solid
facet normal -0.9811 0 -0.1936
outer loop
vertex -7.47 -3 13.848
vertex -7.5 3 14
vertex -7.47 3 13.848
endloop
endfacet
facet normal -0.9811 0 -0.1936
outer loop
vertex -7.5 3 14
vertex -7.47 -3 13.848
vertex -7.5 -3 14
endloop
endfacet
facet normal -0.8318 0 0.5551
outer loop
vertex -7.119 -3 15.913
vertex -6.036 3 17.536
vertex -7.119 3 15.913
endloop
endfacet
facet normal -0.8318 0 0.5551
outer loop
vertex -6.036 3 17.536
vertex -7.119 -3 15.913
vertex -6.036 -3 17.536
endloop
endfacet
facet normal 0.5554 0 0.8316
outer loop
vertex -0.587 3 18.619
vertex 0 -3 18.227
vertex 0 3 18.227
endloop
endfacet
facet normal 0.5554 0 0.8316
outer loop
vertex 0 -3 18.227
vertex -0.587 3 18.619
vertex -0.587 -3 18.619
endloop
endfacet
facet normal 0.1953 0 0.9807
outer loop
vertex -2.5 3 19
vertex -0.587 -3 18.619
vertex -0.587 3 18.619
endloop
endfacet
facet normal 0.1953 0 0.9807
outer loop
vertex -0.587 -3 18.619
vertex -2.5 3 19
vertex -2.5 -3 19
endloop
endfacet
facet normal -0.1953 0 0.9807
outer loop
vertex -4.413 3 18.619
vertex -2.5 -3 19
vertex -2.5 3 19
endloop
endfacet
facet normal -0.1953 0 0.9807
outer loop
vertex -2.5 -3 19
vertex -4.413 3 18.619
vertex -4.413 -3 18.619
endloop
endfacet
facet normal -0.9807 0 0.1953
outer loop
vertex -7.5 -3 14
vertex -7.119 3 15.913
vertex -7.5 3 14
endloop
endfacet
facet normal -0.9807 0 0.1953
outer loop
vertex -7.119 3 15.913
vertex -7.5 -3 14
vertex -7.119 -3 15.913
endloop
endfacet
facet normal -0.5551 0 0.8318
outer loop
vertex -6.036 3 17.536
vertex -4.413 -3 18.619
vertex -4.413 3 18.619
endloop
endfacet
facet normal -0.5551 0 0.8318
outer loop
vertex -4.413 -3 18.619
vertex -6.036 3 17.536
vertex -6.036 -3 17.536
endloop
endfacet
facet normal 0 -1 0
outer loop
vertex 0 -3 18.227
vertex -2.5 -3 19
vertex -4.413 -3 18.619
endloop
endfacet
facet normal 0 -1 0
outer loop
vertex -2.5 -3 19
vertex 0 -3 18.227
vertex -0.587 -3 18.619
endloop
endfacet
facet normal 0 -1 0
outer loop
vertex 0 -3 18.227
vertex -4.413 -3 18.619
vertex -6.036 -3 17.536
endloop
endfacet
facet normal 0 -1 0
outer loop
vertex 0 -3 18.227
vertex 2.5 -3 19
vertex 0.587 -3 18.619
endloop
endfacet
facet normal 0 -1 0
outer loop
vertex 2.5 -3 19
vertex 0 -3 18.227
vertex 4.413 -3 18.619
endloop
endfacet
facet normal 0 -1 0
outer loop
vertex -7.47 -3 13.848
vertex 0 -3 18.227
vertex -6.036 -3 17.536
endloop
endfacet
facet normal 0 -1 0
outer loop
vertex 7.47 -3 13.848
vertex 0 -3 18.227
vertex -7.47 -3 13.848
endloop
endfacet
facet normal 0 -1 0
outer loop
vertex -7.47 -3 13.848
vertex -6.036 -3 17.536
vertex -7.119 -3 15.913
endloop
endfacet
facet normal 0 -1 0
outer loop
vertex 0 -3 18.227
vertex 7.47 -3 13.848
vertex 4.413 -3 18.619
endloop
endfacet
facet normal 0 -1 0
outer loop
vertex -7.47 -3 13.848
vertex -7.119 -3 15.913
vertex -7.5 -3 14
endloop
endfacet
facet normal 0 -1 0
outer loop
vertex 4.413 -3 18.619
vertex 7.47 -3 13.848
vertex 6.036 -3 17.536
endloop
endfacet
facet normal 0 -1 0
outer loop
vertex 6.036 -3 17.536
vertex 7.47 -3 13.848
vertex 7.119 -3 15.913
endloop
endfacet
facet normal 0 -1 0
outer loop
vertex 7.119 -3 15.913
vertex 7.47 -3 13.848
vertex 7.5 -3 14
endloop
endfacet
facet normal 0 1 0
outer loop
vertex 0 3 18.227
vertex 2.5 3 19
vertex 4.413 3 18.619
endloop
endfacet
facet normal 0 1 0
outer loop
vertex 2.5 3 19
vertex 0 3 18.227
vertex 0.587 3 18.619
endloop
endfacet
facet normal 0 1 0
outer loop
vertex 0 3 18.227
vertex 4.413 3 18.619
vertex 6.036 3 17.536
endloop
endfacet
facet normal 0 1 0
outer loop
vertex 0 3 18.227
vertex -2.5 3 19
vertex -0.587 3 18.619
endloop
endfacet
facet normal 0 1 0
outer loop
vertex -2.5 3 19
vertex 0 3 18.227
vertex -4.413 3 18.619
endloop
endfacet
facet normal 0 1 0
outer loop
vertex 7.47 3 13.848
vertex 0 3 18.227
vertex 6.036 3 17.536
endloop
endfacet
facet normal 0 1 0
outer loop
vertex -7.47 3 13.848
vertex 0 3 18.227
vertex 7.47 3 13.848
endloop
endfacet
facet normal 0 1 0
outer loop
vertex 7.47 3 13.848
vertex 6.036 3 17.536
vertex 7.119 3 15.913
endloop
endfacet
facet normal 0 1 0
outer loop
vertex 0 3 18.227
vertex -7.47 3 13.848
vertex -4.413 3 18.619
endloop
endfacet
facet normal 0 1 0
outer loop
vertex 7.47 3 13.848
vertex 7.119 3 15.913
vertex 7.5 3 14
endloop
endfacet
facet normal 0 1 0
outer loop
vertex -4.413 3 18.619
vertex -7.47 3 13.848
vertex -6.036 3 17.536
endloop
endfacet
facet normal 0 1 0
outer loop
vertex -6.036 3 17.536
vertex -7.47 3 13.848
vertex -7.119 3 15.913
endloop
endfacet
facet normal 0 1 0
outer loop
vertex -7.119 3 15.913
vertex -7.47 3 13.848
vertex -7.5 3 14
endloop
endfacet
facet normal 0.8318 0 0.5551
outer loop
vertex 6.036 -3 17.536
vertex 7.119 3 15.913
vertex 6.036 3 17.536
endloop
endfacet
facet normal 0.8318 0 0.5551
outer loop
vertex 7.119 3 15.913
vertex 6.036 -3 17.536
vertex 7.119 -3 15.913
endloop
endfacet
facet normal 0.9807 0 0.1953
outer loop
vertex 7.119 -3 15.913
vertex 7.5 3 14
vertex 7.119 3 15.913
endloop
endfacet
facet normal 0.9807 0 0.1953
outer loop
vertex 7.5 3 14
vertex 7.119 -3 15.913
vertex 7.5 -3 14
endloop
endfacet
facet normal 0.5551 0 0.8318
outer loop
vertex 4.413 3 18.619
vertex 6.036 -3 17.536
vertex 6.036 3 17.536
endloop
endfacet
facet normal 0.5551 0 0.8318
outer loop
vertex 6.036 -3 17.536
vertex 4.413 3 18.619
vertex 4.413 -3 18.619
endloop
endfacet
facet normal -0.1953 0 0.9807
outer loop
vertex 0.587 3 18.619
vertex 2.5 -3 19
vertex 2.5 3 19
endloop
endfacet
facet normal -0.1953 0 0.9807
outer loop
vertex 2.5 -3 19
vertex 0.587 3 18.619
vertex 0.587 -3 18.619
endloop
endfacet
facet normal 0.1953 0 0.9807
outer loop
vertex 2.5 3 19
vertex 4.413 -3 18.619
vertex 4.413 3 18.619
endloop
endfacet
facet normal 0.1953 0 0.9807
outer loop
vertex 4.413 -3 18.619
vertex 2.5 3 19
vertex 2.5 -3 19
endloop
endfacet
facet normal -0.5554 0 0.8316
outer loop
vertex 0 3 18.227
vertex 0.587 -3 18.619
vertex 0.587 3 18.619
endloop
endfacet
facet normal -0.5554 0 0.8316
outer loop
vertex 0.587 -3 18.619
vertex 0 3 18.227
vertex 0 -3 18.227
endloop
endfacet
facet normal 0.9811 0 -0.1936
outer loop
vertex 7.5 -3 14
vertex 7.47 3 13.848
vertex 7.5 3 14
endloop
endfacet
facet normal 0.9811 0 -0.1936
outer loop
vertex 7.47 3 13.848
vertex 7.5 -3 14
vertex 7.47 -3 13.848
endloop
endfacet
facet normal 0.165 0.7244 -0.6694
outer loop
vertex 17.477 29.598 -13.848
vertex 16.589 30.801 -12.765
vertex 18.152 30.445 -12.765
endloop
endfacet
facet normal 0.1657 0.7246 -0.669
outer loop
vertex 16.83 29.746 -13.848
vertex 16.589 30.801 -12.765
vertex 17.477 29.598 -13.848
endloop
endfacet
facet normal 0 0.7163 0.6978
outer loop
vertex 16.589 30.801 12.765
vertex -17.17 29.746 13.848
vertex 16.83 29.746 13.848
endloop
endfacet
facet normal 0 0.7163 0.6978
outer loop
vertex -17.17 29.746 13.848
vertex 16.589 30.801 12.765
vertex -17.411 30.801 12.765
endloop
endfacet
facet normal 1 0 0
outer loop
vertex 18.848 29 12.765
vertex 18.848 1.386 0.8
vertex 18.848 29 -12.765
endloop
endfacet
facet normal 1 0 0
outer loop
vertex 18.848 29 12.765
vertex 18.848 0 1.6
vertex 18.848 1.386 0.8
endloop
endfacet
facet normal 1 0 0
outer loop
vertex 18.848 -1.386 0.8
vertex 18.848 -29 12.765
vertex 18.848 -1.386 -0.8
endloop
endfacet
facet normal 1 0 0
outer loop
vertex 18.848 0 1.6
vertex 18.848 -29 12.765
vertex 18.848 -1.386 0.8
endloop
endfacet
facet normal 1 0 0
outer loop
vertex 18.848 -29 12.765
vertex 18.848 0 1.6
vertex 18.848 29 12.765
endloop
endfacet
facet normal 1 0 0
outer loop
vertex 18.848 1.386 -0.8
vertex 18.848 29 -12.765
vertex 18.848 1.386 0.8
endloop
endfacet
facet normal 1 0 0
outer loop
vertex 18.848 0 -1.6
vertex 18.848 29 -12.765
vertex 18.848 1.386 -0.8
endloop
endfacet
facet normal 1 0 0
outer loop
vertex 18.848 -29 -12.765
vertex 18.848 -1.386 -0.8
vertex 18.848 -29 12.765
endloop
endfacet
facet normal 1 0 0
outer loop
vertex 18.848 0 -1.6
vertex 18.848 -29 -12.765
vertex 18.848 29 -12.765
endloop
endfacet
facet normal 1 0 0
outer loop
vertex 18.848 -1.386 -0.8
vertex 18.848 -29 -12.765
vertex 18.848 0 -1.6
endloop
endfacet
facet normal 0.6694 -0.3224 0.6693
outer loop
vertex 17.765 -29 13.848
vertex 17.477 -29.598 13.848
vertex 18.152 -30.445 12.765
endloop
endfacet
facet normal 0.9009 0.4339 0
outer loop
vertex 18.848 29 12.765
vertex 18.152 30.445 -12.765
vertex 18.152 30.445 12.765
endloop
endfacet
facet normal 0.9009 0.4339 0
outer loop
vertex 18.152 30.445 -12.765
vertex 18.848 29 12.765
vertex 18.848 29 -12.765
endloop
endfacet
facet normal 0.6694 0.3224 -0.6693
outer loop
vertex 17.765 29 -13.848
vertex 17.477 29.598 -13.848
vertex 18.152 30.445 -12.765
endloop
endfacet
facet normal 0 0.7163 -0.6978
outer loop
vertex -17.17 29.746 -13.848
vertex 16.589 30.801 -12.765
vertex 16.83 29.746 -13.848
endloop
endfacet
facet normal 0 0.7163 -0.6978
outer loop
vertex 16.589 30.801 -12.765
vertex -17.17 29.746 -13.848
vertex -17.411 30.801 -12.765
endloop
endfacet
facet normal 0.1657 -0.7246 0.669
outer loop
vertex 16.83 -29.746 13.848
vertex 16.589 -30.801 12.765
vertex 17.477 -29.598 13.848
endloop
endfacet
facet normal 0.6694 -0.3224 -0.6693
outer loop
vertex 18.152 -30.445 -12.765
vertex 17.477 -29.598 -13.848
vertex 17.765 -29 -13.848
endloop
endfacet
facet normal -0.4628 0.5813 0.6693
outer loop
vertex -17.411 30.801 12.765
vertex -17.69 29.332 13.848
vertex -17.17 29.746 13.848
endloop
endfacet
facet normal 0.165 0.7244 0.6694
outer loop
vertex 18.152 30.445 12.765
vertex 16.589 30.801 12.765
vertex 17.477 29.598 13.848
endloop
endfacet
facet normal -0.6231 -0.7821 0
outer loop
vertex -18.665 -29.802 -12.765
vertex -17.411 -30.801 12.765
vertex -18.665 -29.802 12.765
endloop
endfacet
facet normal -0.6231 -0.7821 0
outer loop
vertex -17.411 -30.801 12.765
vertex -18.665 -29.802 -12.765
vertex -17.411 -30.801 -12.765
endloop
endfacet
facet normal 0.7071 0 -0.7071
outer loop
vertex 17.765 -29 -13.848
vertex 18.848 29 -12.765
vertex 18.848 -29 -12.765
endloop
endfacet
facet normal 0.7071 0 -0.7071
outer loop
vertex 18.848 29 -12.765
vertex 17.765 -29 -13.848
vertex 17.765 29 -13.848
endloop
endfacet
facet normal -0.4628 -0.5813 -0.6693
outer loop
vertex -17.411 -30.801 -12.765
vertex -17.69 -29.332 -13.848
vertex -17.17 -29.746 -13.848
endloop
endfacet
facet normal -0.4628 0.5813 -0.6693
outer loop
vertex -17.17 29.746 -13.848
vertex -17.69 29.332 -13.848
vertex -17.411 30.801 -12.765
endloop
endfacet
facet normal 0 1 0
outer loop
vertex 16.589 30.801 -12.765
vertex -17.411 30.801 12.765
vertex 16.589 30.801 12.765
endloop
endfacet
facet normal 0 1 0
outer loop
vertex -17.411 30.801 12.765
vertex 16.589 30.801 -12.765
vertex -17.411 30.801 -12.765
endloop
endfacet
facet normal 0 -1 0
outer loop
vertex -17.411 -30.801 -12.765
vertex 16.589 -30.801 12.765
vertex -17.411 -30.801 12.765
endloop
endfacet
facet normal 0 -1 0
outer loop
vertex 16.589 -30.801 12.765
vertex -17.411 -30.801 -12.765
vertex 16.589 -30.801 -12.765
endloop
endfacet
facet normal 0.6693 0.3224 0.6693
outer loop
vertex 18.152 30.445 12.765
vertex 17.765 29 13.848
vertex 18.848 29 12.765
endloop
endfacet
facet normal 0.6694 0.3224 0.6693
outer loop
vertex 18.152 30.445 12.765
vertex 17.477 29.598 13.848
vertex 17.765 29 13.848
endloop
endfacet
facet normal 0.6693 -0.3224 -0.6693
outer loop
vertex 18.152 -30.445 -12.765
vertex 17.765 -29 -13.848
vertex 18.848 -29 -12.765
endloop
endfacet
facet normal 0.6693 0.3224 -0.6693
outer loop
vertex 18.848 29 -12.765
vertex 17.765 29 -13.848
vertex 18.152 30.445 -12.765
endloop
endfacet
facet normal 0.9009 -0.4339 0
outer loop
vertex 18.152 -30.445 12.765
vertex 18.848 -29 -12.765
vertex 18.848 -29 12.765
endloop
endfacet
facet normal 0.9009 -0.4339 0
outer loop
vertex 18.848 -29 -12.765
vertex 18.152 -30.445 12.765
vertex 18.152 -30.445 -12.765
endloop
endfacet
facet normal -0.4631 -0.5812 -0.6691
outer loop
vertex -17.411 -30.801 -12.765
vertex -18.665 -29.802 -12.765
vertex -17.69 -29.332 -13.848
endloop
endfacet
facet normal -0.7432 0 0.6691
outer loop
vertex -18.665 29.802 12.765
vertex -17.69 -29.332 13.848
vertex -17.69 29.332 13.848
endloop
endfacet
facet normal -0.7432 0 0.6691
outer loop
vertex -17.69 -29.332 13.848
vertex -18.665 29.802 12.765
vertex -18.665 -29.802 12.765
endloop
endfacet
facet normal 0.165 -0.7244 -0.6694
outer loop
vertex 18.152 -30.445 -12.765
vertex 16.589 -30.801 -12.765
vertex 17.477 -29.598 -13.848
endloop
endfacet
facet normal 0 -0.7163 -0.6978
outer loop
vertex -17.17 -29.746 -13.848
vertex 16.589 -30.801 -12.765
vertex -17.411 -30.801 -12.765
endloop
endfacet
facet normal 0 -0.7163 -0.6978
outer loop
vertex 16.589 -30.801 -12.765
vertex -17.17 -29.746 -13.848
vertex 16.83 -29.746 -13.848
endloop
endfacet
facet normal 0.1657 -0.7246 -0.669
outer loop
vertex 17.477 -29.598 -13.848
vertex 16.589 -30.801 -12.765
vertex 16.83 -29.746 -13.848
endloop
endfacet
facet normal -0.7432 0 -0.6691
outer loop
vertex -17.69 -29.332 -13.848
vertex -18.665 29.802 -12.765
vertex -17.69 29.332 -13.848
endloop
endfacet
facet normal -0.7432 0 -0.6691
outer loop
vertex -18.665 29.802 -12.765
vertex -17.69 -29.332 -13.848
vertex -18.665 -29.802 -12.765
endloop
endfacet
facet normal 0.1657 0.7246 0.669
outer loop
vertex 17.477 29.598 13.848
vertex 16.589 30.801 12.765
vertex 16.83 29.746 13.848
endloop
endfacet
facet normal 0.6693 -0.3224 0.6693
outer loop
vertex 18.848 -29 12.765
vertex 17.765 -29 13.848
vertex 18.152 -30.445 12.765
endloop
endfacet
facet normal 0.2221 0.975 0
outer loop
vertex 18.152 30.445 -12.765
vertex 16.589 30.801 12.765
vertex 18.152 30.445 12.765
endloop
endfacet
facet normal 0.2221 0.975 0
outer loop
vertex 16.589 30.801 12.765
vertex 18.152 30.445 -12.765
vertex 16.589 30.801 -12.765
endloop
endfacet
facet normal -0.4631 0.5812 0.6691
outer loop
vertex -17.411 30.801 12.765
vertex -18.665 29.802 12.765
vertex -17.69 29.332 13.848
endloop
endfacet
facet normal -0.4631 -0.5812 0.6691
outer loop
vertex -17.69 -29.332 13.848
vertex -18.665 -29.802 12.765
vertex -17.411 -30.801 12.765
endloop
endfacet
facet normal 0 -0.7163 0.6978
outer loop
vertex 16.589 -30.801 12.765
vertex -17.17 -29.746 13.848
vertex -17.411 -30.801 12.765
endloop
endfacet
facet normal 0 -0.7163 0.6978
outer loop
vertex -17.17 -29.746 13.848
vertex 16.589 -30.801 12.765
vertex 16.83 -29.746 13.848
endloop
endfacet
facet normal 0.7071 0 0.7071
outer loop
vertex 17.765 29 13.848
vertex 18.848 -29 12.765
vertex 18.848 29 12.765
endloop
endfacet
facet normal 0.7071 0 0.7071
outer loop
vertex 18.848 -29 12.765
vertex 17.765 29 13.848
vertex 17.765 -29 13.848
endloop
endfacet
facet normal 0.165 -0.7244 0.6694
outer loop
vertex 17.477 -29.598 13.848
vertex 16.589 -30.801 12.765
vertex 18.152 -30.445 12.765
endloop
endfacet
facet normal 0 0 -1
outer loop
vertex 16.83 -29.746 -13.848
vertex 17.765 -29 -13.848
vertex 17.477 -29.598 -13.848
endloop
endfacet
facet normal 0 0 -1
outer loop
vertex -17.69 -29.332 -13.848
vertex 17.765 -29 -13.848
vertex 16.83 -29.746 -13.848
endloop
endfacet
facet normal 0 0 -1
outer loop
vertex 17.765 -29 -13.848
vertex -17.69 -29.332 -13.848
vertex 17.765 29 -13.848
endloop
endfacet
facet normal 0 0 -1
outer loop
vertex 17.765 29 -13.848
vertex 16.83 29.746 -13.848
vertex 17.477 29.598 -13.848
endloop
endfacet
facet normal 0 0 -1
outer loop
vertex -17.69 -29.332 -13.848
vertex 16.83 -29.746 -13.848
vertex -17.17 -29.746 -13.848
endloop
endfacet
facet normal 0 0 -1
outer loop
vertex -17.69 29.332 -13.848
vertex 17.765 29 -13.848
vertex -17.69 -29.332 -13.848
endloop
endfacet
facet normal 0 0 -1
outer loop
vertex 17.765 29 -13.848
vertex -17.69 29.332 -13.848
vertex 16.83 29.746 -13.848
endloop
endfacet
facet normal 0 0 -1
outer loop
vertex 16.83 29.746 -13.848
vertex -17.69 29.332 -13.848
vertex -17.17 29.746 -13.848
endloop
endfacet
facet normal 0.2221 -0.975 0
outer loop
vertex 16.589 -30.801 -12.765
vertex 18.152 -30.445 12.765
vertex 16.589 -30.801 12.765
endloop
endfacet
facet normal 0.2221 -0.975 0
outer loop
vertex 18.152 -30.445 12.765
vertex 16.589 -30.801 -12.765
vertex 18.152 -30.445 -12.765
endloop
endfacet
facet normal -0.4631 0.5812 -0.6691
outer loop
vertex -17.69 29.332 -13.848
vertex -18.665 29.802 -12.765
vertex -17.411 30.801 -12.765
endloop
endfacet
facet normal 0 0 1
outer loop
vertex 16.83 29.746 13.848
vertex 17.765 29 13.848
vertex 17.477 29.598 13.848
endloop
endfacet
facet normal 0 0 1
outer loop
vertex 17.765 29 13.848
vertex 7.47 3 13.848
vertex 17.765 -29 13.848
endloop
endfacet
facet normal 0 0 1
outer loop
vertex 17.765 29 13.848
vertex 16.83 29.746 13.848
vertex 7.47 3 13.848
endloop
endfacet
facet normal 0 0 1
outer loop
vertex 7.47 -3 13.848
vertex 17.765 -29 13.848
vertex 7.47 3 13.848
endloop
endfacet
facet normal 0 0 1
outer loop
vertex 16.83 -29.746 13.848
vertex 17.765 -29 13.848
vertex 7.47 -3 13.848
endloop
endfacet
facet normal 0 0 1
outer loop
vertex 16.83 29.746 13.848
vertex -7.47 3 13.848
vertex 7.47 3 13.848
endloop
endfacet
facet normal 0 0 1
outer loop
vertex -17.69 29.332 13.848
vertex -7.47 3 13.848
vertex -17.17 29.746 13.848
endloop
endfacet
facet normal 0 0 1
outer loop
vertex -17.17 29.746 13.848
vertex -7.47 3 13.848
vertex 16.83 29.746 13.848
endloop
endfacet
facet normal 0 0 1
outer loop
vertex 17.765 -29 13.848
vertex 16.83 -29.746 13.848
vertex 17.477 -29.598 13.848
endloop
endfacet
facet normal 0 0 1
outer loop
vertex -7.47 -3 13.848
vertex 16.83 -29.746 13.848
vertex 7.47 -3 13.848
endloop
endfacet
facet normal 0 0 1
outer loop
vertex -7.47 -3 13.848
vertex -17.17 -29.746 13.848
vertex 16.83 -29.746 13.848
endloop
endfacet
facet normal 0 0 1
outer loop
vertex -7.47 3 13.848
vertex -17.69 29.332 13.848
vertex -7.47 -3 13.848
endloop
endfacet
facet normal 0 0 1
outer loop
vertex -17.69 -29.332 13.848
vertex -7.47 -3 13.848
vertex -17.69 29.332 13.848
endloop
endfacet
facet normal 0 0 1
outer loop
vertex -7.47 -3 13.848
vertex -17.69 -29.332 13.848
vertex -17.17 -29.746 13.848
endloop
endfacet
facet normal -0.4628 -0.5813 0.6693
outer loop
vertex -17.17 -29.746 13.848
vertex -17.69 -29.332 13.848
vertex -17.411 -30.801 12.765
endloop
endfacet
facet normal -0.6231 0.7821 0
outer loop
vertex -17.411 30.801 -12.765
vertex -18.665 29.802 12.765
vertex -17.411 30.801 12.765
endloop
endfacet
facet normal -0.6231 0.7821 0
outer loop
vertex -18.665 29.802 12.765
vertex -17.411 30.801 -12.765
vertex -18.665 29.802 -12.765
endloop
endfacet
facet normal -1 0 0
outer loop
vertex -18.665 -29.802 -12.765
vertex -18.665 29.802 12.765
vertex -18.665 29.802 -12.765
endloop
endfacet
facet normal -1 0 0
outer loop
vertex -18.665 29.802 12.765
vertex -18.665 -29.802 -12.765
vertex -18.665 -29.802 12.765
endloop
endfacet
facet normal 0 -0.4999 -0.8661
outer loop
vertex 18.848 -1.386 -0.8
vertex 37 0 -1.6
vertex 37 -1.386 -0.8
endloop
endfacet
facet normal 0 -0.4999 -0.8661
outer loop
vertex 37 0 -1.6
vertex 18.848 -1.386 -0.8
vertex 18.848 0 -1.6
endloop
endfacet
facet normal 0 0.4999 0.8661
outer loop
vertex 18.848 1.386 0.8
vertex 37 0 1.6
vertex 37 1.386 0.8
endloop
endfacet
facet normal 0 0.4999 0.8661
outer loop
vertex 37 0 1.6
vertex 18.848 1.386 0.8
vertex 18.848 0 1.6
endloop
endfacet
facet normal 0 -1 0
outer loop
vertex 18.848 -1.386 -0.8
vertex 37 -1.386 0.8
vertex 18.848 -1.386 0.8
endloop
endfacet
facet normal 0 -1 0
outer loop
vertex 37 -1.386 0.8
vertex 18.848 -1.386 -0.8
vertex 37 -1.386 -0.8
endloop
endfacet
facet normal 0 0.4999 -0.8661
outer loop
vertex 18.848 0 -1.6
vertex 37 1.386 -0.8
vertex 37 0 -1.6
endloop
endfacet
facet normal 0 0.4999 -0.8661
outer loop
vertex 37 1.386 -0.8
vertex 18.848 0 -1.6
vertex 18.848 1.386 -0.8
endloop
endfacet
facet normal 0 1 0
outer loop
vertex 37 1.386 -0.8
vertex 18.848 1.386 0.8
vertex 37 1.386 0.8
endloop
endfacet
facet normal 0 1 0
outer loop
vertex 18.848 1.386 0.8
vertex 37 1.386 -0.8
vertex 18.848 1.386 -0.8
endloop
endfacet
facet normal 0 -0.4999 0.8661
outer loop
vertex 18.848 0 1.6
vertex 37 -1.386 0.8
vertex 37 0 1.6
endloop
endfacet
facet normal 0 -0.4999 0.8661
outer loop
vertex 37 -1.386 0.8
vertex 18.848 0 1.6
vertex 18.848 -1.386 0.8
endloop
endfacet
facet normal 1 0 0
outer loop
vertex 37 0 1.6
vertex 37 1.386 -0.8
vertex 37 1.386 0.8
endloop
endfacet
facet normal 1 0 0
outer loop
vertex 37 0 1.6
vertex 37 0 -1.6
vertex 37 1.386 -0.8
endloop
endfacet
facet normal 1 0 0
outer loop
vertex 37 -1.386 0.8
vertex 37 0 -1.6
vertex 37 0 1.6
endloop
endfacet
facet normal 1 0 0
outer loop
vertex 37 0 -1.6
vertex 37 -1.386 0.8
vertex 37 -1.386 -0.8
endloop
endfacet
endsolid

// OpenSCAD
// Parameters
shaft_diameter_mm = 6; //[3:12:0.1]
shaft_bore_clearance_mm = 0.2; //[0.05:0.6:0.05]
block_width_mm = 34; //[17:68:0.5]
block_length_mm = 58; //[29:116:0.5]
block_height_mm = 24; //[12:48:0.5]
corner_radius_mm = 2; //[0:6:0.25]
bearing_outer_diameter_mm = 12; //[8:24:0.1]
bearing_length_mm = 19; //[10:40:0.5]
bearing_seat_clearance_mm = 0.1; //[0:0.4:0.05]
mount_hole_diameter_mm = 5; //[3:8:0.1]
mount_hole_spacing_x_mm = 24; //[12:48:0.5]
mount_hole_spacing_y_mm = 44; //[22:88:0.5]
counterbore_enabled = 1; //[0:1:1]
counterbore_diameter_mm = 9; //[6:14:0.1]
counterbore_depth_mm = 3; //[0:8:0.25]
clamp_enabled = 1; //[0:1:1]
clamp_slot_width_mm = 2; //[1:4:0.1]
clamp_slot_depth_mm = 14; //[6:22:0.5]
clamp_screw_diameter_mm = 3.2; //[2.2:6.5:0.1]
clamp_boss_diameter_mm = 10; //[6:18:0.5]
clamp_boss_height_mm = 6; //[3:12:0.5]
overlap_mm = 1; //[0.5:2:0.1]

// SBR Bearing Block Assembly
module sbr_bearing_block_assembly() {
  color("Silver") {
    // Main block with rounded corners
    minkowski() {
      cube([block_width_mm, block_length_mm, block_height_mm], center=true);
      sphere(r=corner_radius_mm, center=true);
    }
    // Clamp bosses
    if (clamp_enabled) {
      translate([-(clamp_slot_width_mm/2 + clamp_boss_diameter_mm/4 - overlap_mm), 0, block_height_mm/2 + clamp_boss_height_mm/2 - overlap_mm])
        rotate([90, 0, 0]) cylinder(r=clamp_boss_diameter_mm/2, h=clamp_boss_height_mm, center=true);
      translate([(clamp_slot_width_mm/2 + clamp_boss_diameter_mm/4 - overlap_mm), 0, block_height_mm/2 + clamp_boss_height_mm/2 - overlap_mm])
        rotate([90, 0, 0]) cylinder(r=clamp_boss_diameter_mm/2, h=clamp_boss_height_mm, center=true);
    }
  }
}

// SCS Bearing Block
module scs_bearing_block() {
  color("DimGray") {
    // Shaft bore
    rotate([90, 0, 0])
      translate([0, 0, 0])
      cylinder(r=(shaft_diameter_mm + shaft_bore_clearance_mm)/2, h=block_length_mm + 2*overlap_mm, center=true);
    // Bearing seat
    rotate([90, 0, 0])
      translate([0, 0, 0])
      cylinder(r=(bearing_outer_diameter_mm + bearing_seat_clearance_mm)/2, h=bearing_length_mm + 2*overlap_mm, center=true);
  }
}

// SBR Bearing Block
module sbr_bearing_block() {
  color("Black") {
    // Clamp slot
    if (clamp_enabled) {
      translate([0, 0, block_height_mm/2 - clamp_slot_depth_mm/2])
        cube([clamp_slot_width_mm, block_length_mm + 2*overlap_mm, clamp_slot_depth_mm], center=true);
    }
    // Clamp screw hole
    if (clamp_enabled) {
      rotate([0, 90, 0])
        translate([0, 0, block_height_mm/2 + clamp_boss_height_mm/2 - overlap_mm])
        cylinder(r=clamp_screw_diameter_mm/2, h=block_width_mm + clamp_boss_diameter_mm + 2*overlap_mm, center=true);
    }
  }
}

// SCS Bearing Block Hole Positions
module scs_bearing_block_hole_positions() {
  color("Silver") {
    // Mount holes
    translate([mount_hole_spacing_x_mm/2, mount_hole_spacing_y_mm/2, 0])
      cylinder(r=mount_hole_diameter_mm/2, h=block_height_mm + 2*overlap_mm, center=true);
    translate([-mount_hole_spacing_x_mm/2, mount_hole_spacing_y_mm/2, 0])
      cylinder(r=mount_hole_diameter_mm/2, h=block_height_mm + 2*overlap_mm, center=true);
    translate([mount_hole_spacing_x_mm/2, -mount_hole_spacing_y_mm/2, 0])
      cylinder(r=mount_hole_diameter_mm/2, h=block_height_mm + 2*overlap_mm, center=true);
    translate([-mount_hole_spacing_x_mm/2, -mount_hole_spacing_y_mm/2, 0])
      cylinder(r=mount_hole_diameter_mm/2, h=block_height_mm + 2*overlap_mm, center=true);
    // Counterbores
    if (counterbore_enabled) {
      translate([mount_hole_spacing_x_mm/2, mount_hole_spacing_y_mm/2, -block_height_mm/2 + counterbore_depth_mm/2])
        cylinder(r=counterbore_diameter_mm/2, h=counterbore_depth_mm + overlap_mm, center=true);
      translate([-mount_hole_spacing_x_mm/2, mount_hole_spacing_y_mm/2, -block_height_mm/2 + counterbore_depth_mm/2])
        cylinder(r=counterbore_diameter_mm/2, h=counterbore_depth_mm + overlap_mm, center=true);
      translate([mount_hole_spacing_x_mm/2, -mount_hole_spacing_y_mm/2, -block_height_mm/2 + counterbore_depth_mm/2])
        cylinder(r=counterbore_diameter_mm/2, h=counterbore_depth_mm + overlap_mm, center=true);
      translate([-mount_hole_spacing_x_mm/2, -mount_hole_spacing_y_mm/2, -block_height_mm/2 + counterbore_depth_mm/2])
        cylinder(r=counterbore_diameter_mm/2, h=counterbore_depth_mm + overlap_mm, center=true);
    }
  }
}

// Assembly
module assembly() {
  sbr_bearing_block_assembly();
  scs_bearing_block();
  sbr_bearing_block();
  scs_bearing_block_hole_positions();
}

assembly();
